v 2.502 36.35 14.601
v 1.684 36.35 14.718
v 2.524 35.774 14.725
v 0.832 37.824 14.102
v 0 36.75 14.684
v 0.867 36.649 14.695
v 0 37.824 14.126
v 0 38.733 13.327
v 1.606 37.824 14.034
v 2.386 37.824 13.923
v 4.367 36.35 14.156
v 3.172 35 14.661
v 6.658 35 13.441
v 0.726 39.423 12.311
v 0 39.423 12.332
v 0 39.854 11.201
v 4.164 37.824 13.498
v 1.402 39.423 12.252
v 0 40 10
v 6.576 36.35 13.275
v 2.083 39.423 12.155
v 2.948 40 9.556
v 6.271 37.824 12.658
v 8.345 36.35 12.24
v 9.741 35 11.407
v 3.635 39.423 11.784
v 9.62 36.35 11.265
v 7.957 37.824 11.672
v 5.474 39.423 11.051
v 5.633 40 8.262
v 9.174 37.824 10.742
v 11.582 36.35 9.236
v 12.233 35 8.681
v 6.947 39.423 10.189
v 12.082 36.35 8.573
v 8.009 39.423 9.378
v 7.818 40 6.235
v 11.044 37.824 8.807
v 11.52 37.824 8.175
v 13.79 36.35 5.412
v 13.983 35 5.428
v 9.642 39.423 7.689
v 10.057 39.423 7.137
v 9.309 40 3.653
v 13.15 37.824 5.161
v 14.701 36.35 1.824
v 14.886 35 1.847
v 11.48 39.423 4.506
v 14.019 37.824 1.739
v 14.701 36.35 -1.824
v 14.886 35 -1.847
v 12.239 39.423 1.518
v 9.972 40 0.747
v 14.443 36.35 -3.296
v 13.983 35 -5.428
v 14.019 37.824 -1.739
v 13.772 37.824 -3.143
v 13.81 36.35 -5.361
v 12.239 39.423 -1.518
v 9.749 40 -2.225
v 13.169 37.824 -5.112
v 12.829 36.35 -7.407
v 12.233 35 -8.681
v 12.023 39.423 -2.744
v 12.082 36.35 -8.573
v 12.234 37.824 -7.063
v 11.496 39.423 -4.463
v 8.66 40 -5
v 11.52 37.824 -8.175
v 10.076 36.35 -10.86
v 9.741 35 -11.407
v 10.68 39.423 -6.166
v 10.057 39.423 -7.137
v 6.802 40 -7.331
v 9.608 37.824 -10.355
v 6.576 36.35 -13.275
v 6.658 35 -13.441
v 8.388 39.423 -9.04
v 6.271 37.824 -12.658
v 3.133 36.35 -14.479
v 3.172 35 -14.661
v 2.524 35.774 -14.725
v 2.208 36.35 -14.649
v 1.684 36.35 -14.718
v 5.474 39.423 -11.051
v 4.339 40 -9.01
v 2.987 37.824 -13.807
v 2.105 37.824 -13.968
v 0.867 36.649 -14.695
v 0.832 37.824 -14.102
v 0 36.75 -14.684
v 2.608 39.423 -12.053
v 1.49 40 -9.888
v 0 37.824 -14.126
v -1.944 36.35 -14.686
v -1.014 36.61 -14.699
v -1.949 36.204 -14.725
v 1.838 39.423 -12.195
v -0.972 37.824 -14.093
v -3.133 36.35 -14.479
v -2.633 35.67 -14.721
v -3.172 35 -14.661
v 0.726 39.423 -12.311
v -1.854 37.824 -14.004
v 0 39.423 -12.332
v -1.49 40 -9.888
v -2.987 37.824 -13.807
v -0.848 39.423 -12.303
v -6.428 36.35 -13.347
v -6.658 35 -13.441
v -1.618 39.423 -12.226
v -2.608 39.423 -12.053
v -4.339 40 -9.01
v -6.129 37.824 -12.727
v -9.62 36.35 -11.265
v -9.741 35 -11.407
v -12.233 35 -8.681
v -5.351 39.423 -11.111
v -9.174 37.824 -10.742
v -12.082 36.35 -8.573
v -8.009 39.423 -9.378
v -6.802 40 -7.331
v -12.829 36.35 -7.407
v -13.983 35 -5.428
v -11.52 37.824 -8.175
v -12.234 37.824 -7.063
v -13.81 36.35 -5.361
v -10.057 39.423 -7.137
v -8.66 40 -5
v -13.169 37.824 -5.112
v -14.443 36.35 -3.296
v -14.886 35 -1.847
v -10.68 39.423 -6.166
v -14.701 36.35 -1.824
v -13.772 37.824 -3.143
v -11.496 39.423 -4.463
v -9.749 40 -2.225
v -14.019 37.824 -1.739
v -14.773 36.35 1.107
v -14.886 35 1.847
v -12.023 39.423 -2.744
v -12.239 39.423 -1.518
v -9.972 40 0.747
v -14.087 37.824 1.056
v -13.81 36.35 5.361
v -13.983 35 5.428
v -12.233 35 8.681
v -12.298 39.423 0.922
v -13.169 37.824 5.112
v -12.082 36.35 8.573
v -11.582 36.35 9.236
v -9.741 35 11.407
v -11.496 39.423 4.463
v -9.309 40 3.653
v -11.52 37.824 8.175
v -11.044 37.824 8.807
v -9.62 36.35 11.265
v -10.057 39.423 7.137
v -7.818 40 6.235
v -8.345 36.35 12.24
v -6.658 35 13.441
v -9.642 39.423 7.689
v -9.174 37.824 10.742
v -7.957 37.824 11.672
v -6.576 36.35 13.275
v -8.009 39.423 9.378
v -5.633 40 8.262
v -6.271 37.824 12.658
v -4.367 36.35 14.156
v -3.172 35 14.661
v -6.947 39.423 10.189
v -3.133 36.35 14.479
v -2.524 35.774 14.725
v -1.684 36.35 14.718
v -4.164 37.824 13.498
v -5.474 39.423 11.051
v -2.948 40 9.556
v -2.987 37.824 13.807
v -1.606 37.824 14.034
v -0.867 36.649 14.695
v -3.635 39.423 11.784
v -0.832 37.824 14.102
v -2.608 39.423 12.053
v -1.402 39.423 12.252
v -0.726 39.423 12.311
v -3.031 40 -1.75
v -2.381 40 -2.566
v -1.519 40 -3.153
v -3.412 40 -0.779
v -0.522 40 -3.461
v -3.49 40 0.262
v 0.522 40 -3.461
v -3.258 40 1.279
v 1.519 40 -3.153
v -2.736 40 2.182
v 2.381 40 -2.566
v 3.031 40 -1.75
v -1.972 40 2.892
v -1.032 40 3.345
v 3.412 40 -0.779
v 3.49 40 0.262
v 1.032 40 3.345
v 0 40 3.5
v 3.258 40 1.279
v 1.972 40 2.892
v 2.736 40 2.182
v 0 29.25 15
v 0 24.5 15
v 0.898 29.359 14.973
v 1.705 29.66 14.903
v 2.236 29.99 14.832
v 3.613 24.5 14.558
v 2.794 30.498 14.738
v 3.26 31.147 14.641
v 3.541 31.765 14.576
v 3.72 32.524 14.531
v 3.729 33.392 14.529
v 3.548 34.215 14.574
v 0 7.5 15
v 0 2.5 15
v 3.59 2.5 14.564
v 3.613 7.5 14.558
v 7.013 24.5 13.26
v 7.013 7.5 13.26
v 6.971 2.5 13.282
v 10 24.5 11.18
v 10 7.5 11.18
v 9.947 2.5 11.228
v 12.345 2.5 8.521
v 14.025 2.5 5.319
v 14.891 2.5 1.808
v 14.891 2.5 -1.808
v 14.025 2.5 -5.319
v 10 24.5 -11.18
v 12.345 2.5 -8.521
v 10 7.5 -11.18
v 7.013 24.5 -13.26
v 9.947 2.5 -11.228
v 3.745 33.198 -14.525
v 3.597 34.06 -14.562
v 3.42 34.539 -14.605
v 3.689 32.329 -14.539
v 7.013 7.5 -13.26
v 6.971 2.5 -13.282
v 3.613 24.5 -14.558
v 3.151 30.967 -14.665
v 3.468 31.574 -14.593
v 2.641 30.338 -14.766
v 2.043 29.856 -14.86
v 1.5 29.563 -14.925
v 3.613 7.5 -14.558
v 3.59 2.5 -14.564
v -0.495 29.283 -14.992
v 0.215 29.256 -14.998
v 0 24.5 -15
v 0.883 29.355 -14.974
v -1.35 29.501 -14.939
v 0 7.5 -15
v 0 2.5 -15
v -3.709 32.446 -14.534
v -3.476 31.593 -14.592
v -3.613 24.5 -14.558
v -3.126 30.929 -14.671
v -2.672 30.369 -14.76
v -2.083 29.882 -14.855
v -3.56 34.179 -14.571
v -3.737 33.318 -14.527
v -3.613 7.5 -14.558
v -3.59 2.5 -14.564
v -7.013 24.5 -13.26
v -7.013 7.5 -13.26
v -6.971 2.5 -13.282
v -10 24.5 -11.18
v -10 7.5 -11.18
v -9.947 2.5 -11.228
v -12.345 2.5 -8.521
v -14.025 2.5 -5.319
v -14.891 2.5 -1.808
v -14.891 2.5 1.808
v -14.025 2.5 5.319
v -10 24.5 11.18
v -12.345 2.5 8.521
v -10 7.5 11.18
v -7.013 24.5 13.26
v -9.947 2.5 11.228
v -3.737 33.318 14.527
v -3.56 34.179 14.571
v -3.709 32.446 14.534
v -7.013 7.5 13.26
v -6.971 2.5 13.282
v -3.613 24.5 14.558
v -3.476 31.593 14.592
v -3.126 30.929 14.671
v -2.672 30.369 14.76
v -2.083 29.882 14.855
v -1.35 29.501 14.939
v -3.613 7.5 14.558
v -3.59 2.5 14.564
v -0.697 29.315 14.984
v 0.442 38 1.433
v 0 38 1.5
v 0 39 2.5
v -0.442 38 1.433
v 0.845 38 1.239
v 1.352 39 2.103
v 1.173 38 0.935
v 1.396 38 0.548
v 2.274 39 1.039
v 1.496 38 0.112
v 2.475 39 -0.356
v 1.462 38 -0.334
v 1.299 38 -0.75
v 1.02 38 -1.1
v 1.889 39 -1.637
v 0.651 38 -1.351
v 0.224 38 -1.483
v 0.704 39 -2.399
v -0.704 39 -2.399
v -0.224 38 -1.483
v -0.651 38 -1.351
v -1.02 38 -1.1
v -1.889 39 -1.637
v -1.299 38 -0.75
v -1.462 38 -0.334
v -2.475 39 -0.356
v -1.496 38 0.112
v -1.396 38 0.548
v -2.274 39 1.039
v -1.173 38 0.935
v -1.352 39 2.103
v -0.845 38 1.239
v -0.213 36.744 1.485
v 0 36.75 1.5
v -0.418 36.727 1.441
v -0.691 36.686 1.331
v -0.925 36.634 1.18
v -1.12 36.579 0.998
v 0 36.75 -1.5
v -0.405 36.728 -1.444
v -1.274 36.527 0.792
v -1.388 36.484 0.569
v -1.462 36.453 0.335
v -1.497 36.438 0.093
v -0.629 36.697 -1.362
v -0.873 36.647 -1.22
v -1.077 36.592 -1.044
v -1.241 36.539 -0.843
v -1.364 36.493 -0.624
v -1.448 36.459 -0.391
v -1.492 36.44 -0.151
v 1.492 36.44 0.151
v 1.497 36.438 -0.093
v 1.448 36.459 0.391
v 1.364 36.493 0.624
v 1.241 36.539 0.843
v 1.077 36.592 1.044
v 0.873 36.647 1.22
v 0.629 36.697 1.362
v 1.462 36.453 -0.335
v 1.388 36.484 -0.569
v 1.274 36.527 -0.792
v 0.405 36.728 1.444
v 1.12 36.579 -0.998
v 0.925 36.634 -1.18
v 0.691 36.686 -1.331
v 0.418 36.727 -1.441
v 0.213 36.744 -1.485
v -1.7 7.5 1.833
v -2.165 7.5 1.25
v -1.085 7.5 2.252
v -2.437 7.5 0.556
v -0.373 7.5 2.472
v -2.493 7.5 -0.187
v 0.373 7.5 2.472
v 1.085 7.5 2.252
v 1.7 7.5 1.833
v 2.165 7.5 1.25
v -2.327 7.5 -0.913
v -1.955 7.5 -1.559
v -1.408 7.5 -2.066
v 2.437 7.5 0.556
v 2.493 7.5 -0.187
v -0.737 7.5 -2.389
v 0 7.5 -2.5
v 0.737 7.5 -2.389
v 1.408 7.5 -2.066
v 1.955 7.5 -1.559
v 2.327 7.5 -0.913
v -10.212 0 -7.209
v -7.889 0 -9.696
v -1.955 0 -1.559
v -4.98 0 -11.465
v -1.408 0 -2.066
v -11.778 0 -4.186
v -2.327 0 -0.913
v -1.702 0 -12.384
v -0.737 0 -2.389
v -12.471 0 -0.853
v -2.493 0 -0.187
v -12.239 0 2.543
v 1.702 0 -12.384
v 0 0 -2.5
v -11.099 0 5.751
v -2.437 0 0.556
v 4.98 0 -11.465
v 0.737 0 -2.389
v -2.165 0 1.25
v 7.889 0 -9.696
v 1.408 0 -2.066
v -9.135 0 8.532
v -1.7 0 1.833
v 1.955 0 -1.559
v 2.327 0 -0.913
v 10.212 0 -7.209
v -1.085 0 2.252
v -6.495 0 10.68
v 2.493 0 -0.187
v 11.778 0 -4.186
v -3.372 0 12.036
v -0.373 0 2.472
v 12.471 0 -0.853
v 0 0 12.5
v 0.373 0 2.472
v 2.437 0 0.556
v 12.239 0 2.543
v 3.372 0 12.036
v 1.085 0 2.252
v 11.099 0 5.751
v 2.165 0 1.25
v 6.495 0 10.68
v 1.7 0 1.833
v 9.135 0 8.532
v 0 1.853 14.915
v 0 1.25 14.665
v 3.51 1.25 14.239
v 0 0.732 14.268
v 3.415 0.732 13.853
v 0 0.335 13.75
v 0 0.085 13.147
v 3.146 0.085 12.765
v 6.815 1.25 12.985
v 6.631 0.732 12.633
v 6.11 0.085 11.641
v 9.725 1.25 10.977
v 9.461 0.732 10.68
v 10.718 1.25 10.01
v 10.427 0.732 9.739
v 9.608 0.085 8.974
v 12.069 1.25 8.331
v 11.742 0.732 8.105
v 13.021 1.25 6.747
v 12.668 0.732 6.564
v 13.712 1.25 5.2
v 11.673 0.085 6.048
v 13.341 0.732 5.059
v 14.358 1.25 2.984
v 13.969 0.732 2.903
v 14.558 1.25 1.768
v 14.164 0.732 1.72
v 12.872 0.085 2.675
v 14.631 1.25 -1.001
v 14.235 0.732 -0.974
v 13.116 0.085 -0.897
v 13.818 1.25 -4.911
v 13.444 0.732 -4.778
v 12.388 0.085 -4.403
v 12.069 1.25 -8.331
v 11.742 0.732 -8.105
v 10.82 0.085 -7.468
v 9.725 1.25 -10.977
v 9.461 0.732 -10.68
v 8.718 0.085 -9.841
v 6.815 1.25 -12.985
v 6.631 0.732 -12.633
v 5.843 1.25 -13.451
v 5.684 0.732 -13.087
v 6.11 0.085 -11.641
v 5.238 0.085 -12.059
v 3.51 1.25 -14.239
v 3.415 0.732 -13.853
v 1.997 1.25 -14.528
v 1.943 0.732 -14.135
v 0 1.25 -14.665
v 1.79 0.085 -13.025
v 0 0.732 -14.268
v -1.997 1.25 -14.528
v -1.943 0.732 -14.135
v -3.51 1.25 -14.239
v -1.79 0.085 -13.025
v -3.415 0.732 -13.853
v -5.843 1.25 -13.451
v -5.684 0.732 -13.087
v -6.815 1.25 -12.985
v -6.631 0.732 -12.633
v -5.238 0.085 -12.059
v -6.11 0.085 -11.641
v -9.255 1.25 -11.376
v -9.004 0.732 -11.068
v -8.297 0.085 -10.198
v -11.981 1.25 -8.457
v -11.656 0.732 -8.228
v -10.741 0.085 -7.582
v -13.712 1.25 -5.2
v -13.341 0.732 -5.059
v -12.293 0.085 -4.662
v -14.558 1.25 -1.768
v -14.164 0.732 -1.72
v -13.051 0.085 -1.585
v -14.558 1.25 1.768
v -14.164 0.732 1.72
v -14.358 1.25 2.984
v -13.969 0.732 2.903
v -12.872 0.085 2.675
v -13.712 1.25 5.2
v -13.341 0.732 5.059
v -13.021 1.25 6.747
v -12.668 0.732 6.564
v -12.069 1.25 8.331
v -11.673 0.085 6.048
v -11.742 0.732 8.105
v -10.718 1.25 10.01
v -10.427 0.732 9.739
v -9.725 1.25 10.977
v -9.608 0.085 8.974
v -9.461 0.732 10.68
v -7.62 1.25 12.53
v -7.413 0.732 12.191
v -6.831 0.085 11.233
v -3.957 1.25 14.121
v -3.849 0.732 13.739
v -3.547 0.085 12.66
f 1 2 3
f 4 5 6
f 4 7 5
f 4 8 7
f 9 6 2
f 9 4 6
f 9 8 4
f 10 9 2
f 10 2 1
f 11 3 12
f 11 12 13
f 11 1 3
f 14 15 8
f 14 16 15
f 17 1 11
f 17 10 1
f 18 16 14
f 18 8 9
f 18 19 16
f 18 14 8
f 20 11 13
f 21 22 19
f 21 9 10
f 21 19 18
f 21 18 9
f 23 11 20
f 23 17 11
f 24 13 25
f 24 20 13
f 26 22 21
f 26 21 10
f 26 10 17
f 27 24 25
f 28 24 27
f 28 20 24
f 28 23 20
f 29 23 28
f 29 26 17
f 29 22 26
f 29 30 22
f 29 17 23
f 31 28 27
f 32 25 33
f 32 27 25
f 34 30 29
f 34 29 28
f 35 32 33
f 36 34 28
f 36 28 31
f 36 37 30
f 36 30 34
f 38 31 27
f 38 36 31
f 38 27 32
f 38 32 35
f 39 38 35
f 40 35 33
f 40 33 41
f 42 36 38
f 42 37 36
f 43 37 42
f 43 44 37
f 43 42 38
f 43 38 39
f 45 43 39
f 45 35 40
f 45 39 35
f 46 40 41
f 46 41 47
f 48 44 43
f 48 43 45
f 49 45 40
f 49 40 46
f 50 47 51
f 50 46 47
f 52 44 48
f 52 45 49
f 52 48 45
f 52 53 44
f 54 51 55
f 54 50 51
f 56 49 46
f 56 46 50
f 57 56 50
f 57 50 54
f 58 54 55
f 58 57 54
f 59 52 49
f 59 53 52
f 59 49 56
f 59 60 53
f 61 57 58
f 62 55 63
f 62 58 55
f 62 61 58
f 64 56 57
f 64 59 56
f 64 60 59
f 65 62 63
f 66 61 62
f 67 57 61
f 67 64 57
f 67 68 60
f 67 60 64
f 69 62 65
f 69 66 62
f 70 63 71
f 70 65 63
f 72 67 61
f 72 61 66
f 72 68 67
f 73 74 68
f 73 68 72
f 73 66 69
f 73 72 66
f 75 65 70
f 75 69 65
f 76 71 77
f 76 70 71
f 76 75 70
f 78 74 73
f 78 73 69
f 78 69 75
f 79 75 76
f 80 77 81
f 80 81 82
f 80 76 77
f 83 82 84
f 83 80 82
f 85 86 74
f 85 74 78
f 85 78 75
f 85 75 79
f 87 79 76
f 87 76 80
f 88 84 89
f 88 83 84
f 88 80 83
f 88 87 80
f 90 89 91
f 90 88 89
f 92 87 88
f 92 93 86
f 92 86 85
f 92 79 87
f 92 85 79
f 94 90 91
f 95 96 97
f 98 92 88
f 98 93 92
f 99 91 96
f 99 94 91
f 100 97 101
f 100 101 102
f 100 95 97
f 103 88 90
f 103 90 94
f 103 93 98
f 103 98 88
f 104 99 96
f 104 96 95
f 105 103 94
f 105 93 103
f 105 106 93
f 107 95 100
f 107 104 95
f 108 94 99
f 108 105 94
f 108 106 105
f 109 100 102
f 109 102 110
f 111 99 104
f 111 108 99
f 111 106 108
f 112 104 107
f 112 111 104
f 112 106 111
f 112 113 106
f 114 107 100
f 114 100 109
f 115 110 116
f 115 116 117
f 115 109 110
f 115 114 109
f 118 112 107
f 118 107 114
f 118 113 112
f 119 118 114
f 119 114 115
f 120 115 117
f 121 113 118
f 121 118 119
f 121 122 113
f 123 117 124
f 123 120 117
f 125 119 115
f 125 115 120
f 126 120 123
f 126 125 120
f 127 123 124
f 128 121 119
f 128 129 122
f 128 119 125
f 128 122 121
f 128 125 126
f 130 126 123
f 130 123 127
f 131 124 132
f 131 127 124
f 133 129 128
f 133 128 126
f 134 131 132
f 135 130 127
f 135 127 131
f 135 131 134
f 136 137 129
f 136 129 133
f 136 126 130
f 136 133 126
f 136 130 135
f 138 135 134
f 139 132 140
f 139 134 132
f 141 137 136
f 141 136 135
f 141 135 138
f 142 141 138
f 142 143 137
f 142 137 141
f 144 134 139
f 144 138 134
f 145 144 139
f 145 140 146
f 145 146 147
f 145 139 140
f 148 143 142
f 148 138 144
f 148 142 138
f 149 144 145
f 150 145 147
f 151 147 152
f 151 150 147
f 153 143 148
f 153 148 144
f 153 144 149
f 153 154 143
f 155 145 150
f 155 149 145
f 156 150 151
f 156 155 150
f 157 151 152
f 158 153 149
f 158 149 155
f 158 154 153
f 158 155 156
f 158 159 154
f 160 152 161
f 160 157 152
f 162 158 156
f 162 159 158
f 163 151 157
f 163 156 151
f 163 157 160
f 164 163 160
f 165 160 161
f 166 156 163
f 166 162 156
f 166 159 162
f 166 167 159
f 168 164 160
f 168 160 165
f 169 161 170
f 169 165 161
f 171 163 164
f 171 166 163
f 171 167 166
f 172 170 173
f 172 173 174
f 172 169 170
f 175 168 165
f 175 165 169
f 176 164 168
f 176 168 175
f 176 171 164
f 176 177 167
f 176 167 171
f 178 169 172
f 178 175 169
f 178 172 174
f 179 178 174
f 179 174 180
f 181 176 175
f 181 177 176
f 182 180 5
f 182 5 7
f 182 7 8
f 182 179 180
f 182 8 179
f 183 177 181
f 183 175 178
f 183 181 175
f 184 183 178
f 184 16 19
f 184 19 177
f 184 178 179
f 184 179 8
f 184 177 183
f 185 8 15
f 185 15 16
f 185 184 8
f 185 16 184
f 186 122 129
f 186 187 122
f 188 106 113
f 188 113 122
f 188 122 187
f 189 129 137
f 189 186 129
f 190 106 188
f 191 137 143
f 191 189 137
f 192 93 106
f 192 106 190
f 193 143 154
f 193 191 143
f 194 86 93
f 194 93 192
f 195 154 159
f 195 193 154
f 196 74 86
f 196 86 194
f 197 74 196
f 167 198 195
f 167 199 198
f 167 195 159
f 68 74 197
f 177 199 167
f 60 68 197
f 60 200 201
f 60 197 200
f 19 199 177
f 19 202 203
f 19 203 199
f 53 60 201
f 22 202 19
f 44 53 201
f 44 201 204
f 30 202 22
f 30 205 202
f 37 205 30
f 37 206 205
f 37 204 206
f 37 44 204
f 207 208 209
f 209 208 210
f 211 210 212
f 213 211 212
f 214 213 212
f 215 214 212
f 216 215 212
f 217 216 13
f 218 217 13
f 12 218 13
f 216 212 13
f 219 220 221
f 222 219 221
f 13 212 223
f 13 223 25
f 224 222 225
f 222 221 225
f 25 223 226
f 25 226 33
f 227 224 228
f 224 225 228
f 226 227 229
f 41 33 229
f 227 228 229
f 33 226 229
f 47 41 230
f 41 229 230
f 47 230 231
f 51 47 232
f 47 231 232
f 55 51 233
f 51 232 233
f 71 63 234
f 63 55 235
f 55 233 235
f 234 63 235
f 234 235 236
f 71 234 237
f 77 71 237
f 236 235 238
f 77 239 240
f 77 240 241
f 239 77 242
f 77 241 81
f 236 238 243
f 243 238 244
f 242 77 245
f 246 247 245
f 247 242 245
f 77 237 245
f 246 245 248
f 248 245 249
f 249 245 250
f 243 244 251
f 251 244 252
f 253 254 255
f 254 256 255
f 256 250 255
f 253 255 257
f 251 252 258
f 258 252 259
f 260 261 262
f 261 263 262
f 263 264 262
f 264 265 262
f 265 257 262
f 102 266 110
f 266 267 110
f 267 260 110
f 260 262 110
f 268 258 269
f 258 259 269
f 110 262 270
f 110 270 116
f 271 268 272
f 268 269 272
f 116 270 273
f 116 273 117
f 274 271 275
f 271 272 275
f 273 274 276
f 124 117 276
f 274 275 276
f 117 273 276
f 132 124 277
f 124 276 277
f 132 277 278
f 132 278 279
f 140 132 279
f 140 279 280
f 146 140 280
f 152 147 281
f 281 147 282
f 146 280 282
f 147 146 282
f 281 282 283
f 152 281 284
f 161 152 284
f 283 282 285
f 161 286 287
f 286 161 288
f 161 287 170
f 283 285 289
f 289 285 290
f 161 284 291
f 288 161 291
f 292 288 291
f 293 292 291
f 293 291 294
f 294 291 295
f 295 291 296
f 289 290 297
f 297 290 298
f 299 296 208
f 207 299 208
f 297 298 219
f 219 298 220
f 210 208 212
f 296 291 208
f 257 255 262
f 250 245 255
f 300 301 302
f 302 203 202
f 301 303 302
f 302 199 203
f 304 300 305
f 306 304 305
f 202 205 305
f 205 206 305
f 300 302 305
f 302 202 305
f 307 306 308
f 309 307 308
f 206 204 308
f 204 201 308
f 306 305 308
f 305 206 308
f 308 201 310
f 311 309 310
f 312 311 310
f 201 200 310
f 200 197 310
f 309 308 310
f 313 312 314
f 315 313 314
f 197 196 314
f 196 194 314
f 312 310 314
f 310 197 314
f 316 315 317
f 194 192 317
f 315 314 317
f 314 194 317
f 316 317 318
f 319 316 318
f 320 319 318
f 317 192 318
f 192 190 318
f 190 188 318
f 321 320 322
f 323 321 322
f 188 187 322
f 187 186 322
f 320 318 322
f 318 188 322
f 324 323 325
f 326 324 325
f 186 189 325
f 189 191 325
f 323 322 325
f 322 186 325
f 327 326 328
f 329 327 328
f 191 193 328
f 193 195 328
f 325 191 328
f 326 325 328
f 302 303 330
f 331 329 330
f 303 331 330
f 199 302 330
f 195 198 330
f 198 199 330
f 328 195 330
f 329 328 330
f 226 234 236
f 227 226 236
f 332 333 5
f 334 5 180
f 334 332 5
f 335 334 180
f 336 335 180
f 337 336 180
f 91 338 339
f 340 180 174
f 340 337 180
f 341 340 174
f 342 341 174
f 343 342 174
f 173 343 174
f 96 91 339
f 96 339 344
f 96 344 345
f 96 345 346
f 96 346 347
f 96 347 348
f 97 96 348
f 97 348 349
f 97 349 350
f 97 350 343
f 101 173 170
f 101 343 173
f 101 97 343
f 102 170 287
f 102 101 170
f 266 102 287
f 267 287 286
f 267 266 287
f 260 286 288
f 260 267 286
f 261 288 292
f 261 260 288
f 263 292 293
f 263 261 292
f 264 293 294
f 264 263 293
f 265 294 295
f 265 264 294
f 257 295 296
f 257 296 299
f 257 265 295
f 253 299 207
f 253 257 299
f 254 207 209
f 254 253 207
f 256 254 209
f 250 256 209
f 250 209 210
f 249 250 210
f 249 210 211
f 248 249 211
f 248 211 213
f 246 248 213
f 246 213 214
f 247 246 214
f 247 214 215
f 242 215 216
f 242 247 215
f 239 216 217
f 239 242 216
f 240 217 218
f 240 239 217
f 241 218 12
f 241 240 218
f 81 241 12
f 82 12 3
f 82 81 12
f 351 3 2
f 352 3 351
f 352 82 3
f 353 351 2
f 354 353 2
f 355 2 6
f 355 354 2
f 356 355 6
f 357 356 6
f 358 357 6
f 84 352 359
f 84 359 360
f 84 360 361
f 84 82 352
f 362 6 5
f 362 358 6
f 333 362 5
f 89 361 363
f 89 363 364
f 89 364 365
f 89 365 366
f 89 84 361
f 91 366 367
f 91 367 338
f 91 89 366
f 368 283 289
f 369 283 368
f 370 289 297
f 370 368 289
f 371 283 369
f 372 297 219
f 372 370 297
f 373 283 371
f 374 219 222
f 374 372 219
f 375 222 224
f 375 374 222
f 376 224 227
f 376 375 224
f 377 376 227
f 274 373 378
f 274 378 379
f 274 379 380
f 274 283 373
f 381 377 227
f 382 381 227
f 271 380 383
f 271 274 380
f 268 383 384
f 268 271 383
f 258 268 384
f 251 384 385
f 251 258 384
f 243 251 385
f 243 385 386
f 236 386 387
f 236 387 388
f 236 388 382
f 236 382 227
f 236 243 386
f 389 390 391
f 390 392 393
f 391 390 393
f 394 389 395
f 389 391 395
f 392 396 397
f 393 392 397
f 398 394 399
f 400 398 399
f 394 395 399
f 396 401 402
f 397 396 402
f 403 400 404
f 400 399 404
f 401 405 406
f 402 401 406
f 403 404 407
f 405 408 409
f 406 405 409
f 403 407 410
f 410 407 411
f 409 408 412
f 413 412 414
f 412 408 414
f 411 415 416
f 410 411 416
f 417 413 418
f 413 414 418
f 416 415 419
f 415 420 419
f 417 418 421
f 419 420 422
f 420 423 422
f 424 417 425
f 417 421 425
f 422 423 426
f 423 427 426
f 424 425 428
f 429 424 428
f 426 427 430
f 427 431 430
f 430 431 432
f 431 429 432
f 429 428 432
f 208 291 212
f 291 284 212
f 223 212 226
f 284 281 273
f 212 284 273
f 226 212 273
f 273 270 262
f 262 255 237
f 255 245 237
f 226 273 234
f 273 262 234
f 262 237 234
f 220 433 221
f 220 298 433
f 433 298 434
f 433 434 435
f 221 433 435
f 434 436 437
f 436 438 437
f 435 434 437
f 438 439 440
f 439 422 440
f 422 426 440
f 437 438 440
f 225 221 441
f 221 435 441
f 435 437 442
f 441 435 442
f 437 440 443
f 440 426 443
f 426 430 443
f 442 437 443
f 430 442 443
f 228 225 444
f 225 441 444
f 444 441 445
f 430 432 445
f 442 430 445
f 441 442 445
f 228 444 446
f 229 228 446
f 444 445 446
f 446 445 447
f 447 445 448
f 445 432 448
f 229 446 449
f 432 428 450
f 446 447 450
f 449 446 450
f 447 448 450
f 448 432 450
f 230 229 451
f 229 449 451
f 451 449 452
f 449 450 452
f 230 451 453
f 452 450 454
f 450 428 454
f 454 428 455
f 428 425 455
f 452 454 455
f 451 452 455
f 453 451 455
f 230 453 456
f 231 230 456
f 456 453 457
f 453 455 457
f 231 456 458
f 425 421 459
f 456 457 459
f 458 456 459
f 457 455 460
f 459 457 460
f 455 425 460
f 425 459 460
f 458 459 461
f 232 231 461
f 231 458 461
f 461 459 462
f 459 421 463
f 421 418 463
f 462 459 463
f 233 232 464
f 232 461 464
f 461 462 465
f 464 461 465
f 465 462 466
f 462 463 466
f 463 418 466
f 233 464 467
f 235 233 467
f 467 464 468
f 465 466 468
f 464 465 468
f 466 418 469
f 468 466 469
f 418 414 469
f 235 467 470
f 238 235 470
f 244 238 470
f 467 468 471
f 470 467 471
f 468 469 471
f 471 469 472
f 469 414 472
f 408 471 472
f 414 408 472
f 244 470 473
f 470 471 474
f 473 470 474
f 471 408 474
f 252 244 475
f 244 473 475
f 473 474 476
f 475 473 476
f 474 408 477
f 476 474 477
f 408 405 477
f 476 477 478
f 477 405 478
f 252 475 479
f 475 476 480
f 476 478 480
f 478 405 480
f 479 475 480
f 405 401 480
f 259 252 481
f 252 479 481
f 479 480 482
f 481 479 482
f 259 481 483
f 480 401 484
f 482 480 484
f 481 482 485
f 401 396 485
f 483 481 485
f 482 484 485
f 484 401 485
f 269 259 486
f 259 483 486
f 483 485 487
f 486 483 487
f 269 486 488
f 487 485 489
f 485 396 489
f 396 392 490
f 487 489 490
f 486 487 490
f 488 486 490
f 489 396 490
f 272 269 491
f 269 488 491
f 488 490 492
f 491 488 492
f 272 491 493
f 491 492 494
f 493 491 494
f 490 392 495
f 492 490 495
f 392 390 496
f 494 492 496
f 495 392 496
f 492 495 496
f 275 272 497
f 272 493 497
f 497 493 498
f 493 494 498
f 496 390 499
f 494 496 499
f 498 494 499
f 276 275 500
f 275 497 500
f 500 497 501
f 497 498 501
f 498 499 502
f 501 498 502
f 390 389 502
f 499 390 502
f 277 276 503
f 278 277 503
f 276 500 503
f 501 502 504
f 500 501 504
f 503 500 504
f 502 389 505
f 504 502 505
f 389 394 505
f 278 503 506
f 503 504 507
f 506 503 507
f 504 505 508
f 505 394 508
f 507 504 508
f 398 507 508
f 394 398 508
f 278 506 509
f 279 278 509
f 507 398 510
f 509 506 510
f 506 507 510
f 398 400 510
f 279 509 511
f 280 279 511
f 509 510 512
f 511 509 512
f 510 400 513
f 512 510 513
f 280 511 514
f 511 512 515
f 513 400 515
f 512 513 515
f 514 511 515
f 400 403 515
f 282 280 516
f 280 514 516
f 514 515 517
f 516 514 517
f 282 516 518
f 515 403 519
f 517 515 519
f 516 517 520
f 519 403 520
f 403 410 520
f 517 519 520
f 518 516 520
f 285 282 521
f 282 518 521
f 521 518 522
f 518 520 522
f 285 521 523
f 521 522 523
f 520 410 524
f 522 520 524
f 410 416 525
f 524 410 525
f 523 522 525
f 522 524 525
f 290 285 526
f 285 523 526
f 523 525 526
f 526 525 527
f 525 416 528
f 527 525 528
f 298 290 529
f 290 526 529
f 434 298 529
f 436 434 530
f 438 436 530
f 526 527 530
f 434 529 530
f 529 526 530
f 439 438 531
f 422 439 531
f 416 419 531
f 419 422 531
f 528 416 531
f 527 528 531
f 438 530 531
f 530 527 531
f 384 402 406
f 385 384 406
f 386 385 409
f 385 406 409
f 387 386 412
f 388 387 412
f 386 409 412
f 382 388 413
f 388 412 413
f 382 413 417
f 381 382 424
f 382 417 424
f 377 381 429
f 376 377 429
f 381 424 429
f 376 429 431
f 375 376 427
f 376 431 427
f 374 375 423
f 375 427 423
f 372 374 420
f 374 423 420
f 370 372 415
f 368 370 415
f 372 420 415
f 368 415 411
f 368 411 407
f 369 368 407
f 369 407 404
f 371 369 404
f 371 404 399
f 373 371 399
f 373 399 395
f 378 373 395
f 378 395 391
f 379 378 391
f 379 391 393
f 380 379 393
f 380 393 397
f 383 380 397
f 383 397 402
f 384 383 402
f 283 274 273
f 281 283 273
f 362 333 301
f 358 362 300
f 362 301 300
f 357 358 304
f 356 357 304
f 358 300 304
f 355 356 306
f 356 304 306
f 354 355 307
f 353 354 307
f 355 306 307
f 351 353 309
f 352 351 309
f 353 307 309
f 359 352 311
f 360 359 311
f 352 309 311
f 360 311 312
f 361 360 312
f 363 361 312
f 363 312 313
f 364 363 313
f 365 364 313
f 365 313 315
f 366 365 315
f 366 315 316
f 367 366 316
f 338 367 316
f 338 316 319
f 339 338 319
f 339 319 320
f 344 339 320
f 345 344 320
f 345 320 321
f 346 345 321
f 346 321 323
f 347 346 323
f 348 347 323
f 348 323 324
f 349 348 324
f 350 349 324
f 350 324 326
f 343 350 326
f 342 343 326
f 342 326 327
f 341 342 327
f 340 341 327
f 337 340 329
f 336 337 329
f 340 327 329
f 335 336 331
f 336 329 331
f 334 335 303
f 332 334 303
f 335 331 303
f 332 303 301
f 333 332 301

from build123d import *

# Parameters (mm, degrees)
SKETCH1_R               = 15
BOSS_EXTRUDE1_DEPTH     = 40
CUT_EXTRUDE1_DEPTH      = 40
CUT_EXTRUDE1_DEPTH_BACK = 40
SKETCH2_R               = 3.75
SKETCH4_R               = 1.5
CUT_EXTRUDE2_DEPTH      = 8
SKETCH5_R               = 2.5
CUT_EXTRUDE3_DEPTH      = 8
FILLET1_R               = 5
CHAMFER1_SIZE           = 2
FILLET2_R               = 2.5


with BuildPart() as part:
    # Sketch1 → Boss-Extrude1 (new body)
    with BuildSketch(Plane(origin=(0, 0, 0), x_dir=(1, 0, 0), z_dir=(0, 1, 0))):
        with Locations(Location((0, 0, 0), (0, 0, 270))):
            Circle(SKETCH1_R)
    extrude(amount=BOSS_EXTRUDE1_DEPTH)

    # Sketch2 → Cut-Extrude1 (cut, two sides: drawn at the far end of the back side and taken through both)
    with BuildSketch(Plane.XY.offset(-CUT_EXTRUDE1_DEPTH_BACK)):
        Polygon((10, 7.5), (0, 7.5), (-10, 7.5), (-10, 24.5), (10, 24.5), align=None)
        with Locations(Location((0, 33, 0), (0, 0, 89.999999996))):
            Circle(SKETCH2_R)
    extrude(amount=CUT_EXTRUDE1_DEPTH + CUT_EXTRUDE1_DEPTH_BACK, mode=Mode.SUBTRACT)

    # Sketch4 → Cut-Extrude2 (cut)
    with BuildSketch(Plane(origin=(0, 40, 0), x_dir=(1, 0, 0), z_dir=(0, 1, 0))):
        with Locations(Location((0, 0, 0), (0, 0, 270))):
            Circle(SKETCH4_R)
    extrude(amount=-CUT_EXTRUDE2_DEPTH, mode=Mode.SUBTRACT)

    # Sketch5 → Cut-Extrude3 (cut)
    with BuildSketch(Plane.XZ):
        with Locations(Location((0, 0, 0), (0, 0, 270))):
            Circle(SKETCH5_R)
    extrude(amount=-CUT_EXTRUDE3_DEPTH, mode=Mode.SUBTRACT)

    # Fillet1
    # the kernel refuses this fillet: 5 mm, written as the material it takes off along each edge
    with BuildSketch(Plane(origin=(0, 40, 0), x_dir=(0, 0, 1), z_dir=(-1, 0, 0))) as fillet1_piece_1:
        with BuildLine():
            CenterArc((15 - FILLET1_R, -FILLET1_R), FILLET1_R, 0, 90)
            Line((15 - FILLET1_R, 0), (15, 0))
            Line((15, 0), (15, -FILLET1_R))
        make_face()
    revolve(axis=Axis((0, 40, 0), (0, 1, 0)), mode=Mode.SUBTRACT)

    # Chamfer1
    chamfer1_edges = [part.edges().sort_by_distance(p)[0] for p in [
        (0, 40, -1.5),
    ]]
    chamfer(chamfer1_edges, length=CHAMFER1_SIZE)

    # Fillet2
    fillet2_edges = [part.edges().sort_by_distance(p)[0] for p in [
        (0, 0, -15),
    ]]
    fillet(fillet2_edges, radius=FILLET2_R)


solid = part.part
